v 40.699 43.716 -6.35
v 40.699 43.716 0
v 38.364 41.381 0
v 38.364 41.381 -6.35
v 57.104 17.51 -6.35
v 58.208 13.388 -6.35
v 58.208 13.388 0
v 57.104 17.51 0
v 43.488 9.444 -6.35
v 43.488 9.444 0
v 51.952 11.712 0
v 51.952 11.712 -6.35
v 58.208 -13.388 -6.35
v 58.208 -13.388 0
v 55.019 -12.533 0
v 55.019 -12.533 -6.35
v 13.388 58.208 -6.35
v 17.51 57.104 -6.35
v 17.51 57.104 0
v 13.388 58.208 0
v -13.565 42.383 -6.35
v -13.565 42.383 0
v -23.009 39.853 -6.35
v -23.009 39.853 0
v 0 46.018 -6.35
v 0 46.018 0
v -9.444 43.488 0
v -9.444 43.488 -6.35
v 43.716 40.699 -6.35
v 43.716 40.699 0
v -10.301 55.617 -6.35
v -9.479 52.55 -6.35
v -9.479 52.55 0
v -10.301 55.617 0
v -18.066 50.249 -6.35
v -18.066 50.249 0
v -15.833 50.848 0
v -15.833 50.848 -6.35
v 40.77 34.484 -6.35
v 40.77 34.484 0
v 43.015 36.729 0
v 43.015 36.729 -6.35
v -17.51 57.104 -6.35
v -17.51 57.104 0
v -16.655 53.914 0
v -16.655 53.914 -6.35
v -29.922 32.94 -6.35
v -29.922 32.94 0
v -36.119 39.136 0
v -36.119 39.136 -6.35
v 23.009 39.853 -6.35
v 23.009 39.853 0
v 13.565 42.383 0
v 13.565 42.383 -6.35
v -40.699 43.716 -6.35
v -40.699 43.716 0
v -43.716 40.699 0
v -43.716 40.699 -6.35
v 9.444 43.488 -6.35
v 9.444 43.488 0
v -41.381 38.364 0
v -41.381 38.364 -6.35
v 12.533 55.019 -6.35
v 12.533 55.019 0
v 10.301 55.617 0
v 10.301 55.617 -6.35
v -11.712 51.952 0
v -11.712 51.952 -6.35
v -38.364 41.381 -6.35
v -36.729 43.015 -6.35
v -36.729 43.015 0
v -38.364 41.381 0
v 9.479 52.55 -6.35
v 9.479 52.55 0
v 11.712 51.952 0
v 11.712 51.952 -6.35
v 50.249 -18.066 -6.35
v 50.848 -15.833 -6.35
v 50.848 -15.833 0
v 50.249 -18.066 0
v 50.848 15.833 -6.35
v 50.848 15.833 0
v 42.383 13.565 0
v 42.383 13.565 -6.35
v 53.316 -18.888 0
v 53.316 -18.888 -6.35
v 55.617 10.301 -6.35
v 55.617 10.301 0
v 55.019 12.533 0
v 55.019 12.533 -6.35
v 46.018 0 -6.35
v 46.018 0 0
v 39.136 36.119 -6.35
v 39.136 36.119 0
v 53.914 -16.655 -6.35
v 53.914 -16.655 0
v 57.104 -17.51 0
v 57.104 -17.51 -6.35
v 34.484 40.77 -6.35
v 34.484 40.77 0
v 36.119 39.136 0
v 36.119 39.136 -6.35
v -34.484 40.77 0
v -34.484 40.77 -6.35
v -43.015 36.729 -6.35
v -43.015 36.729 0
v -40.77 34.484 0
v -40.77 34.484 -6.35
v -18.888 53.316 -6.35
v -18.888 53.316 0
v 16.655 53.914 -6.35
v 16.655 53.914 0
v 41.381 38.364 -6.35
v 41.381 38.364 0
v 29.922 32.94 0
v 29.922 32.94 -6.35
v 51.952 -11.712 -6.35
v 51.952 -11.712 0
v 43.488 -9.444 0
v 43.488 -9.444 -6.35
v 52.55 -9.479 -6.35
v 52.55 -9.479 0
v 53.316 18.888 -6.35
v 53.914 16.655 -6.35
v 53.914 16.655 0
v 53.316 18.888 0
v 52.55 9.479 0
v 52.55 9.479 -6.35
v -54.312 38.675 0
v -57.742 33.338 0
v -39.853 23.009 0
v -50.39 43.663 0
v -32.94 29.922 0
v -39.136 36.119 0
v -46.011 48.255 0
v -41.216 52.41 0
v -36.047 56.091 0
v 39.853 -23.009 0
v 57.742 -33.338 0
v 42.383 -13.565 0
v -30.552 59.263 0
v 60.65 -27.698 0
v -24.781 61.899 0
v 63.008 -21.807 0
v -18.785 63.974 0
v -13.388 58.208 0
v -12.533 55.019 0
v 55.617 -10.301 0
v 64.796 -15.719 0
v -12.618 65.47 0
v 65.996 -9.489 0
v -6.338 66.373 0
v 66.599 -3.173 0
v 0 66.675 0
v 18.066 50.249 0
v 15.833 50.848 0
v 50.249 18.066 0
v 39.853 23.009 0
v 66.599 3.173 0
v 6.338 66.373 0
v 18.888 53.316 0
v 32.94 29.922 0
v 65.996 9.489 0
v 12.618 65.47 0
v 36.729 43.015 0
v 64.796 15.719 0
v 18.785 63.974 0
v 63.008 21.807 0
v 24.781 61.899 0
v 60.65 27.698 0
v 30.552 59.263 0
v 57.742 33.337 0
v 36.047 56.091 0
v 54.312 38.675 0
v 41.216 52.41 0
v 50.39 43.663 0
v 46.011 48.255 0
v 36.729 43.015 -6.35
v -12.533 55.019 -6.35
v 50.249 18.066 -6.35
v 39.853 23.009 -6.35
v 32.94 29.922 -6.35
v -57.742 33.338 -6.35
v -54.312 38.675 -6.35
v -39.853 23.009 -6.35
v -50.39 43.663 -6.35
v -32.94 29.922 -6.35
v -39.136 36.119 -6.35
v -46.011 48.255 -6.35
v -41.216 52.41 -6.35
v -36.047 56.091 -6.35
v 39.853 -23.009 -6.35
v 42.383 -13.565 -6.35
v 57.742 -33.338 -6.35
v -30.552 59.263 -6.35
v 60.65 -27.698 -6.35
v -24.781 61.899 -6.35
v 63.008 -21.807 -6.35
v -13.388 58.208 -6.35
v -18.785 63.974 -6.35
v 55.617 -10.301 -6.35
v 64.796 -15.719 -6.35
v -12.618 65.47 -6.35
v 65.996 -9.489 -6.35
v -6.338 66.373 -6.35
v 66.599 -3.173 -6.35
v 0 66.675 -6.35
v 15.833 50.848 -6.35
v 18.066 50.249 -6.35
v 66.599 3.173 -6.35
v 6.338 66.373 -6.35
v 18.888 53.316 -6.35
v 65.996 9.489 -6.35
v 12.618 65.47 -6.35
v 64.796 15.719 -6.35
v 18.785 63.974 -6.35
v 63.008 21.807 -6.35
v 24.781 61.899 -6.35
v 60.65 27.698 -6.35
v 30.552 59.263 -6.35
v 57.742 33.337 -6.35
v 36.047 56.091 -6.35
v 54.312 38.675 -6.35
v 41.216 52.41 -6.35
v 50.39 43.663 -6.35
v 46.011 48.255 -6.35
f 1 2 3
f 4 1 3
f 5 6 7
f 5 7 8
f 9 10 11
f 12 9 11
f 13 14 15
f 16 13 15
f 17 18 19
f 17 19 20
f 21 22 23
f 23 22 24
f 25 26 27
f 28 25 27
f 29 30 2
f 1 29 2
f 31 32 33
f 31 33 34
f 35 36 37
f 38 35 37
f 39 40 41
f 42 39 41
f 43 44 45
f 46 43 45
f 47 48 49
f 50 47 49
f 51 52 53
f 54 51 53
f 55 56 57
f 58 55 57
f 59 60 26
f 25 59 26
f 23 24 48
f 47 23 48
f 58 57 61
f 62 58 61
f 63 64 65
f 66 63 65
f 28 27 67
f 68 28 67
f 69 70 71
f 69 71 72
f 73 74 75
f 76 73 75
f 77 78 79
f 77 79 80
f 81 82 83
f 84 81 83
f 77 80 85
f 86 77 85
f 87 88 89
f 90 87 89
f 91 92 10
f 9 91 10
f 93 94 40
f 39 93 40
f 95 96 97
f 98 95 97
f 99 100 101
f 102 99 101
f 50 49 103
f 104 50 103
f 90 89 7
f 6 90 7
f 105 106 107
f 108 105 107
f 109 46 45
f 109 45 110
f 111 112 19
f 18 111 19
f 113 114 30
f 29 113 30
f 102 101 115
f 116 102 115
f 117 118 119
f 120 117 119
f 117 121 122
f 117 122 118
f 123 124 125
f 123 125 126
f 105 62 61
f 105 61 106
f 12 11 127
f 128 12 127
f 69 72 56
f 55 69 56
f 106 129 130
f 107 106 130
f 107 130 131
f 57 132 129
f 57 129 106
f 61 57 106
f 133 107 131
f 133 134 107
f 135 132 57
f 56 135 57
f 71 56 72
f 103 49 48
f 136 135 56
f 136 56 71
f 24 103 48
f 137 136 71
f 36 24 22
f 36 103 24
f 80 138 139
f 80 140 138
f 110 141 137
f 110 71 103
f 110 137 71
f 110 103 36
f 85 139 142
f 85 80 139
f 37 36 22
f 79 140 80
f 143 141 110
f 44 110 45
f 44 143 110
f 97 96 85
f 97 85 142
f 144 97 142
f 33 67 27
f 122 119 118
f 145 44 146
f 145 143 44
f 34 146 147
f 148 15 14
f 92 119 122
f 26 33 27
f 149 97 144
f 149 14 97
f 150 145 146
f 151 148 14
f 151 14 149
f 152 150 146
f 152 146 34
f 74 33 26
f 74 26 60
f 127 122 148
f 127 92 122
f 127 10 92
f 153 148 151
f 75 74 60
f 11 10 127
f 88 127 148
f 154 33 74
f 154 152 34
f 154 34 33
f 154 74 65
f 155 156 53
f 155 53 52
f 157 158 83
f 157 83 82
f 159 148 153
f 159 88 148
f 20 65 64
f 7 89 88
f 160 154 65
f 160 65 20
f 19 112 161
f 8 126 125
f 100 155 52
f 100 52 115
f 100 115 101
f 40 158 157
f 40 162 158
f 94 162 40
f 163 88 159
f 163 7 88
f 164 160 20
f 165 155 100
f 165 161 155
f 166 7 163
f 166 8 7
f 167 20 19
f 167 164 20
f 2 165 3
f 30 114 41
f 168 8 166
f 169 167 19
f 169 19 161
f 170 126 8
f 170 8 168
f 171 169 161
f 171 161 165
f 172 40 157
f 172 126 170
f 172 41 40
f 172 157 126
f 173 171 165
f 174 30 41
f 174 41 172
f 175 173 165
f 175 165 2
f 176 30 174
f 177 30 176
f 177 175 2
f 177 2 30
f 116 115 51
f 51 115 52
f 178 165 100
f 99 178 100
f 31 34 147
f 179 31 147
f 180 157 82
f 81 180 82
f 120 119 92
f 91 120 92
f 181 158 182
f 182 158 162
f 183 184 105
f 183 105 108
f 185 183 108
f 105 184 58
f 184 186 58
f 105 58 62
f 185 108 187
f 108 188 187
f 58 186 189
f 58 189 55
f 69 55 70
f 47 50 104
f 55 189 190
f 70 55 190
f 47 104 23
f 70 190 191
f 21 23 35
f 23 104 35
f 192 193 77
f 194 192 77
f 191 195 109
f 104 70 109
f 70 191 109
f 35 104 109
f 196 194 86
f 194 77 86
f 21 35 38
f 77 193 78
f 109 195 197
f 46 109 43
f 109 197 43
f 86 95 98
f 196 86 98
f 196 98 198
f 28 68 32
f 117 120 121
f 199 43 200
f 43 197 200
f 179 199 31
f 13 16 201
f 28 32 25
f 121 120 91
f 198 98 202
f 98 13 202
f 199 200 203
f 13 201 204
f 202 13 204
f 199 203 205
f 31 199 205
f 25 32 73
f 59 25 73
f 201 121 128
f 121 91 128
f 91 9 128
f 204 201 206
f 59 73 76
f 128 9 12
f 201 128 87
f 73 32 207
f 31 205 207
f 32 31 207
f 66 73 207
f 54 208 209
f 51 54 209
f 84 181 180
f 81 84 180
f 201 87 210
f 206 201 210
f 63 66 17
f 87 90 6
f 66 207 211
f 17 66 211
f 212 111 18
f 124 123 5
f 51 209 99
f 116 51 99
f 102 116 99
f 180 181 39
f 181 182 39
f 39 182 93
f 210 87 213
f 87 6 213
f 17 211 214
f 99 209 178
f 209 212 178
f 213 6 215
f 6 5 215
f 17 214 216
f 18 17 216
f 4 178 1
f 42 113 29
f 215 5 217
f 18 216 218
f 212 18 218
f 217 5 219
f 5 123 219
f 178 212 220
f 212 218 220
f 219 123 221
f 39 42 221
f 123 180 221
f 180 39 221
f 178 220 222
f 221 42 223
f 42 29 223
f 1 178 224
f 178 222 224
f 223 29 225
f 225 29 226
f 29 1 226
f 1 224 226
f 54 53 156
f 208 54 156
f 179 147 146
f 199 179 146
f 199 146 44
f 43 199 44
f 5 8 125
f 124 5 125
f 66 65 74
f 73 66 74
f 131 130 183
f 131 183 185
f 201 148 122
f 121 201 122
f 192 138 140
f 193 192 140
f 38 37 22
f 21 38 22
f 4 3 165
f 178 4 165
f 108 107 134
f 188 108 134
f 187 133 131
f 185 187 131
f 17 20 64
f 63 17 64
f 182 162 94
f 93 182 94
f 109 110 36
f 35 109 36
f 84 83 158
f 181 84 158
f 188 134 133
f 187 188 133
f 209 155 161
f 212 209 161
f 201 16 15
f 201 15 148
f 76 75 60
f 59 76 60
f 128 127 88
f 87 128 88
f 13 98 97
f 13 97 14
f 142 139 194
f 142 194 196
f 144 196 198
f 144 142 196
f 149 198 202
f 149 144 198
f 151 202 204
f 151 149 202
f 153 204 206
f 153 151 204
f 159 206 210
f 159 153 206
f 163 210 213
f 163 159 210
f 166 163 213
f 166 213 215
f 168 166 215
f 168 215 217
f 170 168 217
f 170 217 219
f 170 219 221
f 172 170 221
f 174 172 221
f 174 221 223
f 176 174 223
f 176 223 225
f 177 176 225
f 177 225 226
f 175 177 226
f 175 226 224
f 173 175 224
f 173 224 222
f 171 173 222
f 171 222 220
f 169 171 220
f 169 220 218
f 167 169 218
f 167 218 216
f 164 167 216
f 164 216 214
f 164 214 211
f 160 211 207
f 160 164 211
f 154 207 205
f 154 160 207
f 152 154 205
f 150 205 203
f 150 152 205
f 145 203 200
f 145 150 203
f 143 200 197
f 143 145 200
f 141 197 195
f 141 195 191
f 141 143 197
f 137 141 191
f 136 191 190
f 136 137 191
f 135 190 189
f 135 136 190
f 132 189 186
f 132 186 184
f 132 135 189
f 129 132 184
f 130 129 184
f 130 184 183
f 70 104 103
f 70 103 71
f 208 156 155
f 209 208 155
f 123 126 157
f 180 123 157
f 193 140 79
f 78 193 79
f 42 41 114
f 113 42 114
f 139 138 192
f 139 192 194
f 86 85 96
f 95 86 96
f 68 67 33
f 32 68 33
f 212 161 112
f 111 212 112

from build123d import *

# Parameters (mm, degrees)
SKETCH1_R           = 66.675
BOSS_EXTRUDE1_DEPTH = 6.35
CUT_EXTRUDE1_DEPTH  = 95.50626302
CIRPATTERN1_COUNT   = 6
CIRPATTERN1_ANGLE   = 150
CUT_EXTRUDE2_START  = -6.35
CUT_EXTRUDE2_DEPTH  = 6.35


with BuildPart() as part:
    # Sketch1 → Boss-Extrude1 (new body)
    with BuildSketch(Plane.XY):
        Circle(SKETCH1_R)
        Polygon((0, 46.018026219), (-23.00901311, 39.852779738), (-39.852779738, 23.00901311), (-46.018026219, 0), (-39.852779738, -23.00901311), (-23.00901311, -39.852779738), (0, -46.018026219), (23.00901311, -39.852779738), (39.852779738, -23.00901311), (46.018026219, 0), (39.852779738, 23.00901311), (23.00901311, 39.852779738), align=None, mode=Mode.SUBTRACT)
    extrude(amount=-BOSS_EXTRUDE1_DEPTH)

    # Sketch2 → Cut-Extrude1 (cut, through all)
    with BuildSketch(Plane.XY):
        Polygon((43.487619293, -9.443607212), (42.383186664, -13.565405898), (50.84759468, -15.83343719), (50.249360339, -18.066078145), (53.316174837, -18.887828613), (53.914409178, -16.655187658), (57.103896257, -17.509808145), (58.208328886, -13.388009459), (55.018841807, -12.533388972), (55.617076148, -10.300748017), (52.55026165, -9.478997549), (51.952027309, -11.711638504), align=None)
    cut_extrude1 = extrude(amount=-CUT_EXTRUDE1_DEPTH, mode=Mode.SUBTRACT)

    # CirPattern1: Cut-Extrude1 ×6 about axis
    cirpattern1_axis = Axis((0, 0, 0), (0, 0, 1))
    for i in range(1, CIRPATTERN1_COUNT):
        add(cut_extrude1.rotate(cirpattern1_axis, i * CIRPATTERN1_ANGLE / (CIRPATTERN1_COUNT - 1)), mode=Mode.SUBTRACT)

    # Sketch3 → Cut-Extrude2 (cut)
    with BuildSketch(Plane(origin=(0, 0, -6.35), x_dir=(-1, 0, 0), z_dir=(0, 0, -1)).offset(CUT_EXTRUDE2_START)):
        with BuildLine():
            Line((-39.852779738, -23.00901311), (-57.742243797, -33.3375))
            ThreePointArc((-57.742243797, -33.3375), (17.256759832, -64.403104468), (66.675, 0))
            ThreePointArc((66.675, 0), (64.403104468, 17.256759832), (57.742243797, 33.3375))
            Line((57.742243797, 33.3375), (39.852779738, 23.00901311))
            Line((39.852779738, 23.00901311), (46.018026219, 0))
            Line((46.018026219, 0), (39.852779738, -23.00901311))
            Line((39.852779738, -23.00901311), (23.00901311, -39.852779738))
            Line((23.00901311, -39.852779738), (0, -46.018026219))
            Line((0, -46.018026219), (-23.00901311, -39.852779738))
            Line((-23.00901311, -39.852779738), (-39.852779738, -23.00901311))
        make_face()
    extrude(amount=CUT_EXTRUDE2_DEPTH, mode=Mode.SUBTRACT)


solid = part.part
